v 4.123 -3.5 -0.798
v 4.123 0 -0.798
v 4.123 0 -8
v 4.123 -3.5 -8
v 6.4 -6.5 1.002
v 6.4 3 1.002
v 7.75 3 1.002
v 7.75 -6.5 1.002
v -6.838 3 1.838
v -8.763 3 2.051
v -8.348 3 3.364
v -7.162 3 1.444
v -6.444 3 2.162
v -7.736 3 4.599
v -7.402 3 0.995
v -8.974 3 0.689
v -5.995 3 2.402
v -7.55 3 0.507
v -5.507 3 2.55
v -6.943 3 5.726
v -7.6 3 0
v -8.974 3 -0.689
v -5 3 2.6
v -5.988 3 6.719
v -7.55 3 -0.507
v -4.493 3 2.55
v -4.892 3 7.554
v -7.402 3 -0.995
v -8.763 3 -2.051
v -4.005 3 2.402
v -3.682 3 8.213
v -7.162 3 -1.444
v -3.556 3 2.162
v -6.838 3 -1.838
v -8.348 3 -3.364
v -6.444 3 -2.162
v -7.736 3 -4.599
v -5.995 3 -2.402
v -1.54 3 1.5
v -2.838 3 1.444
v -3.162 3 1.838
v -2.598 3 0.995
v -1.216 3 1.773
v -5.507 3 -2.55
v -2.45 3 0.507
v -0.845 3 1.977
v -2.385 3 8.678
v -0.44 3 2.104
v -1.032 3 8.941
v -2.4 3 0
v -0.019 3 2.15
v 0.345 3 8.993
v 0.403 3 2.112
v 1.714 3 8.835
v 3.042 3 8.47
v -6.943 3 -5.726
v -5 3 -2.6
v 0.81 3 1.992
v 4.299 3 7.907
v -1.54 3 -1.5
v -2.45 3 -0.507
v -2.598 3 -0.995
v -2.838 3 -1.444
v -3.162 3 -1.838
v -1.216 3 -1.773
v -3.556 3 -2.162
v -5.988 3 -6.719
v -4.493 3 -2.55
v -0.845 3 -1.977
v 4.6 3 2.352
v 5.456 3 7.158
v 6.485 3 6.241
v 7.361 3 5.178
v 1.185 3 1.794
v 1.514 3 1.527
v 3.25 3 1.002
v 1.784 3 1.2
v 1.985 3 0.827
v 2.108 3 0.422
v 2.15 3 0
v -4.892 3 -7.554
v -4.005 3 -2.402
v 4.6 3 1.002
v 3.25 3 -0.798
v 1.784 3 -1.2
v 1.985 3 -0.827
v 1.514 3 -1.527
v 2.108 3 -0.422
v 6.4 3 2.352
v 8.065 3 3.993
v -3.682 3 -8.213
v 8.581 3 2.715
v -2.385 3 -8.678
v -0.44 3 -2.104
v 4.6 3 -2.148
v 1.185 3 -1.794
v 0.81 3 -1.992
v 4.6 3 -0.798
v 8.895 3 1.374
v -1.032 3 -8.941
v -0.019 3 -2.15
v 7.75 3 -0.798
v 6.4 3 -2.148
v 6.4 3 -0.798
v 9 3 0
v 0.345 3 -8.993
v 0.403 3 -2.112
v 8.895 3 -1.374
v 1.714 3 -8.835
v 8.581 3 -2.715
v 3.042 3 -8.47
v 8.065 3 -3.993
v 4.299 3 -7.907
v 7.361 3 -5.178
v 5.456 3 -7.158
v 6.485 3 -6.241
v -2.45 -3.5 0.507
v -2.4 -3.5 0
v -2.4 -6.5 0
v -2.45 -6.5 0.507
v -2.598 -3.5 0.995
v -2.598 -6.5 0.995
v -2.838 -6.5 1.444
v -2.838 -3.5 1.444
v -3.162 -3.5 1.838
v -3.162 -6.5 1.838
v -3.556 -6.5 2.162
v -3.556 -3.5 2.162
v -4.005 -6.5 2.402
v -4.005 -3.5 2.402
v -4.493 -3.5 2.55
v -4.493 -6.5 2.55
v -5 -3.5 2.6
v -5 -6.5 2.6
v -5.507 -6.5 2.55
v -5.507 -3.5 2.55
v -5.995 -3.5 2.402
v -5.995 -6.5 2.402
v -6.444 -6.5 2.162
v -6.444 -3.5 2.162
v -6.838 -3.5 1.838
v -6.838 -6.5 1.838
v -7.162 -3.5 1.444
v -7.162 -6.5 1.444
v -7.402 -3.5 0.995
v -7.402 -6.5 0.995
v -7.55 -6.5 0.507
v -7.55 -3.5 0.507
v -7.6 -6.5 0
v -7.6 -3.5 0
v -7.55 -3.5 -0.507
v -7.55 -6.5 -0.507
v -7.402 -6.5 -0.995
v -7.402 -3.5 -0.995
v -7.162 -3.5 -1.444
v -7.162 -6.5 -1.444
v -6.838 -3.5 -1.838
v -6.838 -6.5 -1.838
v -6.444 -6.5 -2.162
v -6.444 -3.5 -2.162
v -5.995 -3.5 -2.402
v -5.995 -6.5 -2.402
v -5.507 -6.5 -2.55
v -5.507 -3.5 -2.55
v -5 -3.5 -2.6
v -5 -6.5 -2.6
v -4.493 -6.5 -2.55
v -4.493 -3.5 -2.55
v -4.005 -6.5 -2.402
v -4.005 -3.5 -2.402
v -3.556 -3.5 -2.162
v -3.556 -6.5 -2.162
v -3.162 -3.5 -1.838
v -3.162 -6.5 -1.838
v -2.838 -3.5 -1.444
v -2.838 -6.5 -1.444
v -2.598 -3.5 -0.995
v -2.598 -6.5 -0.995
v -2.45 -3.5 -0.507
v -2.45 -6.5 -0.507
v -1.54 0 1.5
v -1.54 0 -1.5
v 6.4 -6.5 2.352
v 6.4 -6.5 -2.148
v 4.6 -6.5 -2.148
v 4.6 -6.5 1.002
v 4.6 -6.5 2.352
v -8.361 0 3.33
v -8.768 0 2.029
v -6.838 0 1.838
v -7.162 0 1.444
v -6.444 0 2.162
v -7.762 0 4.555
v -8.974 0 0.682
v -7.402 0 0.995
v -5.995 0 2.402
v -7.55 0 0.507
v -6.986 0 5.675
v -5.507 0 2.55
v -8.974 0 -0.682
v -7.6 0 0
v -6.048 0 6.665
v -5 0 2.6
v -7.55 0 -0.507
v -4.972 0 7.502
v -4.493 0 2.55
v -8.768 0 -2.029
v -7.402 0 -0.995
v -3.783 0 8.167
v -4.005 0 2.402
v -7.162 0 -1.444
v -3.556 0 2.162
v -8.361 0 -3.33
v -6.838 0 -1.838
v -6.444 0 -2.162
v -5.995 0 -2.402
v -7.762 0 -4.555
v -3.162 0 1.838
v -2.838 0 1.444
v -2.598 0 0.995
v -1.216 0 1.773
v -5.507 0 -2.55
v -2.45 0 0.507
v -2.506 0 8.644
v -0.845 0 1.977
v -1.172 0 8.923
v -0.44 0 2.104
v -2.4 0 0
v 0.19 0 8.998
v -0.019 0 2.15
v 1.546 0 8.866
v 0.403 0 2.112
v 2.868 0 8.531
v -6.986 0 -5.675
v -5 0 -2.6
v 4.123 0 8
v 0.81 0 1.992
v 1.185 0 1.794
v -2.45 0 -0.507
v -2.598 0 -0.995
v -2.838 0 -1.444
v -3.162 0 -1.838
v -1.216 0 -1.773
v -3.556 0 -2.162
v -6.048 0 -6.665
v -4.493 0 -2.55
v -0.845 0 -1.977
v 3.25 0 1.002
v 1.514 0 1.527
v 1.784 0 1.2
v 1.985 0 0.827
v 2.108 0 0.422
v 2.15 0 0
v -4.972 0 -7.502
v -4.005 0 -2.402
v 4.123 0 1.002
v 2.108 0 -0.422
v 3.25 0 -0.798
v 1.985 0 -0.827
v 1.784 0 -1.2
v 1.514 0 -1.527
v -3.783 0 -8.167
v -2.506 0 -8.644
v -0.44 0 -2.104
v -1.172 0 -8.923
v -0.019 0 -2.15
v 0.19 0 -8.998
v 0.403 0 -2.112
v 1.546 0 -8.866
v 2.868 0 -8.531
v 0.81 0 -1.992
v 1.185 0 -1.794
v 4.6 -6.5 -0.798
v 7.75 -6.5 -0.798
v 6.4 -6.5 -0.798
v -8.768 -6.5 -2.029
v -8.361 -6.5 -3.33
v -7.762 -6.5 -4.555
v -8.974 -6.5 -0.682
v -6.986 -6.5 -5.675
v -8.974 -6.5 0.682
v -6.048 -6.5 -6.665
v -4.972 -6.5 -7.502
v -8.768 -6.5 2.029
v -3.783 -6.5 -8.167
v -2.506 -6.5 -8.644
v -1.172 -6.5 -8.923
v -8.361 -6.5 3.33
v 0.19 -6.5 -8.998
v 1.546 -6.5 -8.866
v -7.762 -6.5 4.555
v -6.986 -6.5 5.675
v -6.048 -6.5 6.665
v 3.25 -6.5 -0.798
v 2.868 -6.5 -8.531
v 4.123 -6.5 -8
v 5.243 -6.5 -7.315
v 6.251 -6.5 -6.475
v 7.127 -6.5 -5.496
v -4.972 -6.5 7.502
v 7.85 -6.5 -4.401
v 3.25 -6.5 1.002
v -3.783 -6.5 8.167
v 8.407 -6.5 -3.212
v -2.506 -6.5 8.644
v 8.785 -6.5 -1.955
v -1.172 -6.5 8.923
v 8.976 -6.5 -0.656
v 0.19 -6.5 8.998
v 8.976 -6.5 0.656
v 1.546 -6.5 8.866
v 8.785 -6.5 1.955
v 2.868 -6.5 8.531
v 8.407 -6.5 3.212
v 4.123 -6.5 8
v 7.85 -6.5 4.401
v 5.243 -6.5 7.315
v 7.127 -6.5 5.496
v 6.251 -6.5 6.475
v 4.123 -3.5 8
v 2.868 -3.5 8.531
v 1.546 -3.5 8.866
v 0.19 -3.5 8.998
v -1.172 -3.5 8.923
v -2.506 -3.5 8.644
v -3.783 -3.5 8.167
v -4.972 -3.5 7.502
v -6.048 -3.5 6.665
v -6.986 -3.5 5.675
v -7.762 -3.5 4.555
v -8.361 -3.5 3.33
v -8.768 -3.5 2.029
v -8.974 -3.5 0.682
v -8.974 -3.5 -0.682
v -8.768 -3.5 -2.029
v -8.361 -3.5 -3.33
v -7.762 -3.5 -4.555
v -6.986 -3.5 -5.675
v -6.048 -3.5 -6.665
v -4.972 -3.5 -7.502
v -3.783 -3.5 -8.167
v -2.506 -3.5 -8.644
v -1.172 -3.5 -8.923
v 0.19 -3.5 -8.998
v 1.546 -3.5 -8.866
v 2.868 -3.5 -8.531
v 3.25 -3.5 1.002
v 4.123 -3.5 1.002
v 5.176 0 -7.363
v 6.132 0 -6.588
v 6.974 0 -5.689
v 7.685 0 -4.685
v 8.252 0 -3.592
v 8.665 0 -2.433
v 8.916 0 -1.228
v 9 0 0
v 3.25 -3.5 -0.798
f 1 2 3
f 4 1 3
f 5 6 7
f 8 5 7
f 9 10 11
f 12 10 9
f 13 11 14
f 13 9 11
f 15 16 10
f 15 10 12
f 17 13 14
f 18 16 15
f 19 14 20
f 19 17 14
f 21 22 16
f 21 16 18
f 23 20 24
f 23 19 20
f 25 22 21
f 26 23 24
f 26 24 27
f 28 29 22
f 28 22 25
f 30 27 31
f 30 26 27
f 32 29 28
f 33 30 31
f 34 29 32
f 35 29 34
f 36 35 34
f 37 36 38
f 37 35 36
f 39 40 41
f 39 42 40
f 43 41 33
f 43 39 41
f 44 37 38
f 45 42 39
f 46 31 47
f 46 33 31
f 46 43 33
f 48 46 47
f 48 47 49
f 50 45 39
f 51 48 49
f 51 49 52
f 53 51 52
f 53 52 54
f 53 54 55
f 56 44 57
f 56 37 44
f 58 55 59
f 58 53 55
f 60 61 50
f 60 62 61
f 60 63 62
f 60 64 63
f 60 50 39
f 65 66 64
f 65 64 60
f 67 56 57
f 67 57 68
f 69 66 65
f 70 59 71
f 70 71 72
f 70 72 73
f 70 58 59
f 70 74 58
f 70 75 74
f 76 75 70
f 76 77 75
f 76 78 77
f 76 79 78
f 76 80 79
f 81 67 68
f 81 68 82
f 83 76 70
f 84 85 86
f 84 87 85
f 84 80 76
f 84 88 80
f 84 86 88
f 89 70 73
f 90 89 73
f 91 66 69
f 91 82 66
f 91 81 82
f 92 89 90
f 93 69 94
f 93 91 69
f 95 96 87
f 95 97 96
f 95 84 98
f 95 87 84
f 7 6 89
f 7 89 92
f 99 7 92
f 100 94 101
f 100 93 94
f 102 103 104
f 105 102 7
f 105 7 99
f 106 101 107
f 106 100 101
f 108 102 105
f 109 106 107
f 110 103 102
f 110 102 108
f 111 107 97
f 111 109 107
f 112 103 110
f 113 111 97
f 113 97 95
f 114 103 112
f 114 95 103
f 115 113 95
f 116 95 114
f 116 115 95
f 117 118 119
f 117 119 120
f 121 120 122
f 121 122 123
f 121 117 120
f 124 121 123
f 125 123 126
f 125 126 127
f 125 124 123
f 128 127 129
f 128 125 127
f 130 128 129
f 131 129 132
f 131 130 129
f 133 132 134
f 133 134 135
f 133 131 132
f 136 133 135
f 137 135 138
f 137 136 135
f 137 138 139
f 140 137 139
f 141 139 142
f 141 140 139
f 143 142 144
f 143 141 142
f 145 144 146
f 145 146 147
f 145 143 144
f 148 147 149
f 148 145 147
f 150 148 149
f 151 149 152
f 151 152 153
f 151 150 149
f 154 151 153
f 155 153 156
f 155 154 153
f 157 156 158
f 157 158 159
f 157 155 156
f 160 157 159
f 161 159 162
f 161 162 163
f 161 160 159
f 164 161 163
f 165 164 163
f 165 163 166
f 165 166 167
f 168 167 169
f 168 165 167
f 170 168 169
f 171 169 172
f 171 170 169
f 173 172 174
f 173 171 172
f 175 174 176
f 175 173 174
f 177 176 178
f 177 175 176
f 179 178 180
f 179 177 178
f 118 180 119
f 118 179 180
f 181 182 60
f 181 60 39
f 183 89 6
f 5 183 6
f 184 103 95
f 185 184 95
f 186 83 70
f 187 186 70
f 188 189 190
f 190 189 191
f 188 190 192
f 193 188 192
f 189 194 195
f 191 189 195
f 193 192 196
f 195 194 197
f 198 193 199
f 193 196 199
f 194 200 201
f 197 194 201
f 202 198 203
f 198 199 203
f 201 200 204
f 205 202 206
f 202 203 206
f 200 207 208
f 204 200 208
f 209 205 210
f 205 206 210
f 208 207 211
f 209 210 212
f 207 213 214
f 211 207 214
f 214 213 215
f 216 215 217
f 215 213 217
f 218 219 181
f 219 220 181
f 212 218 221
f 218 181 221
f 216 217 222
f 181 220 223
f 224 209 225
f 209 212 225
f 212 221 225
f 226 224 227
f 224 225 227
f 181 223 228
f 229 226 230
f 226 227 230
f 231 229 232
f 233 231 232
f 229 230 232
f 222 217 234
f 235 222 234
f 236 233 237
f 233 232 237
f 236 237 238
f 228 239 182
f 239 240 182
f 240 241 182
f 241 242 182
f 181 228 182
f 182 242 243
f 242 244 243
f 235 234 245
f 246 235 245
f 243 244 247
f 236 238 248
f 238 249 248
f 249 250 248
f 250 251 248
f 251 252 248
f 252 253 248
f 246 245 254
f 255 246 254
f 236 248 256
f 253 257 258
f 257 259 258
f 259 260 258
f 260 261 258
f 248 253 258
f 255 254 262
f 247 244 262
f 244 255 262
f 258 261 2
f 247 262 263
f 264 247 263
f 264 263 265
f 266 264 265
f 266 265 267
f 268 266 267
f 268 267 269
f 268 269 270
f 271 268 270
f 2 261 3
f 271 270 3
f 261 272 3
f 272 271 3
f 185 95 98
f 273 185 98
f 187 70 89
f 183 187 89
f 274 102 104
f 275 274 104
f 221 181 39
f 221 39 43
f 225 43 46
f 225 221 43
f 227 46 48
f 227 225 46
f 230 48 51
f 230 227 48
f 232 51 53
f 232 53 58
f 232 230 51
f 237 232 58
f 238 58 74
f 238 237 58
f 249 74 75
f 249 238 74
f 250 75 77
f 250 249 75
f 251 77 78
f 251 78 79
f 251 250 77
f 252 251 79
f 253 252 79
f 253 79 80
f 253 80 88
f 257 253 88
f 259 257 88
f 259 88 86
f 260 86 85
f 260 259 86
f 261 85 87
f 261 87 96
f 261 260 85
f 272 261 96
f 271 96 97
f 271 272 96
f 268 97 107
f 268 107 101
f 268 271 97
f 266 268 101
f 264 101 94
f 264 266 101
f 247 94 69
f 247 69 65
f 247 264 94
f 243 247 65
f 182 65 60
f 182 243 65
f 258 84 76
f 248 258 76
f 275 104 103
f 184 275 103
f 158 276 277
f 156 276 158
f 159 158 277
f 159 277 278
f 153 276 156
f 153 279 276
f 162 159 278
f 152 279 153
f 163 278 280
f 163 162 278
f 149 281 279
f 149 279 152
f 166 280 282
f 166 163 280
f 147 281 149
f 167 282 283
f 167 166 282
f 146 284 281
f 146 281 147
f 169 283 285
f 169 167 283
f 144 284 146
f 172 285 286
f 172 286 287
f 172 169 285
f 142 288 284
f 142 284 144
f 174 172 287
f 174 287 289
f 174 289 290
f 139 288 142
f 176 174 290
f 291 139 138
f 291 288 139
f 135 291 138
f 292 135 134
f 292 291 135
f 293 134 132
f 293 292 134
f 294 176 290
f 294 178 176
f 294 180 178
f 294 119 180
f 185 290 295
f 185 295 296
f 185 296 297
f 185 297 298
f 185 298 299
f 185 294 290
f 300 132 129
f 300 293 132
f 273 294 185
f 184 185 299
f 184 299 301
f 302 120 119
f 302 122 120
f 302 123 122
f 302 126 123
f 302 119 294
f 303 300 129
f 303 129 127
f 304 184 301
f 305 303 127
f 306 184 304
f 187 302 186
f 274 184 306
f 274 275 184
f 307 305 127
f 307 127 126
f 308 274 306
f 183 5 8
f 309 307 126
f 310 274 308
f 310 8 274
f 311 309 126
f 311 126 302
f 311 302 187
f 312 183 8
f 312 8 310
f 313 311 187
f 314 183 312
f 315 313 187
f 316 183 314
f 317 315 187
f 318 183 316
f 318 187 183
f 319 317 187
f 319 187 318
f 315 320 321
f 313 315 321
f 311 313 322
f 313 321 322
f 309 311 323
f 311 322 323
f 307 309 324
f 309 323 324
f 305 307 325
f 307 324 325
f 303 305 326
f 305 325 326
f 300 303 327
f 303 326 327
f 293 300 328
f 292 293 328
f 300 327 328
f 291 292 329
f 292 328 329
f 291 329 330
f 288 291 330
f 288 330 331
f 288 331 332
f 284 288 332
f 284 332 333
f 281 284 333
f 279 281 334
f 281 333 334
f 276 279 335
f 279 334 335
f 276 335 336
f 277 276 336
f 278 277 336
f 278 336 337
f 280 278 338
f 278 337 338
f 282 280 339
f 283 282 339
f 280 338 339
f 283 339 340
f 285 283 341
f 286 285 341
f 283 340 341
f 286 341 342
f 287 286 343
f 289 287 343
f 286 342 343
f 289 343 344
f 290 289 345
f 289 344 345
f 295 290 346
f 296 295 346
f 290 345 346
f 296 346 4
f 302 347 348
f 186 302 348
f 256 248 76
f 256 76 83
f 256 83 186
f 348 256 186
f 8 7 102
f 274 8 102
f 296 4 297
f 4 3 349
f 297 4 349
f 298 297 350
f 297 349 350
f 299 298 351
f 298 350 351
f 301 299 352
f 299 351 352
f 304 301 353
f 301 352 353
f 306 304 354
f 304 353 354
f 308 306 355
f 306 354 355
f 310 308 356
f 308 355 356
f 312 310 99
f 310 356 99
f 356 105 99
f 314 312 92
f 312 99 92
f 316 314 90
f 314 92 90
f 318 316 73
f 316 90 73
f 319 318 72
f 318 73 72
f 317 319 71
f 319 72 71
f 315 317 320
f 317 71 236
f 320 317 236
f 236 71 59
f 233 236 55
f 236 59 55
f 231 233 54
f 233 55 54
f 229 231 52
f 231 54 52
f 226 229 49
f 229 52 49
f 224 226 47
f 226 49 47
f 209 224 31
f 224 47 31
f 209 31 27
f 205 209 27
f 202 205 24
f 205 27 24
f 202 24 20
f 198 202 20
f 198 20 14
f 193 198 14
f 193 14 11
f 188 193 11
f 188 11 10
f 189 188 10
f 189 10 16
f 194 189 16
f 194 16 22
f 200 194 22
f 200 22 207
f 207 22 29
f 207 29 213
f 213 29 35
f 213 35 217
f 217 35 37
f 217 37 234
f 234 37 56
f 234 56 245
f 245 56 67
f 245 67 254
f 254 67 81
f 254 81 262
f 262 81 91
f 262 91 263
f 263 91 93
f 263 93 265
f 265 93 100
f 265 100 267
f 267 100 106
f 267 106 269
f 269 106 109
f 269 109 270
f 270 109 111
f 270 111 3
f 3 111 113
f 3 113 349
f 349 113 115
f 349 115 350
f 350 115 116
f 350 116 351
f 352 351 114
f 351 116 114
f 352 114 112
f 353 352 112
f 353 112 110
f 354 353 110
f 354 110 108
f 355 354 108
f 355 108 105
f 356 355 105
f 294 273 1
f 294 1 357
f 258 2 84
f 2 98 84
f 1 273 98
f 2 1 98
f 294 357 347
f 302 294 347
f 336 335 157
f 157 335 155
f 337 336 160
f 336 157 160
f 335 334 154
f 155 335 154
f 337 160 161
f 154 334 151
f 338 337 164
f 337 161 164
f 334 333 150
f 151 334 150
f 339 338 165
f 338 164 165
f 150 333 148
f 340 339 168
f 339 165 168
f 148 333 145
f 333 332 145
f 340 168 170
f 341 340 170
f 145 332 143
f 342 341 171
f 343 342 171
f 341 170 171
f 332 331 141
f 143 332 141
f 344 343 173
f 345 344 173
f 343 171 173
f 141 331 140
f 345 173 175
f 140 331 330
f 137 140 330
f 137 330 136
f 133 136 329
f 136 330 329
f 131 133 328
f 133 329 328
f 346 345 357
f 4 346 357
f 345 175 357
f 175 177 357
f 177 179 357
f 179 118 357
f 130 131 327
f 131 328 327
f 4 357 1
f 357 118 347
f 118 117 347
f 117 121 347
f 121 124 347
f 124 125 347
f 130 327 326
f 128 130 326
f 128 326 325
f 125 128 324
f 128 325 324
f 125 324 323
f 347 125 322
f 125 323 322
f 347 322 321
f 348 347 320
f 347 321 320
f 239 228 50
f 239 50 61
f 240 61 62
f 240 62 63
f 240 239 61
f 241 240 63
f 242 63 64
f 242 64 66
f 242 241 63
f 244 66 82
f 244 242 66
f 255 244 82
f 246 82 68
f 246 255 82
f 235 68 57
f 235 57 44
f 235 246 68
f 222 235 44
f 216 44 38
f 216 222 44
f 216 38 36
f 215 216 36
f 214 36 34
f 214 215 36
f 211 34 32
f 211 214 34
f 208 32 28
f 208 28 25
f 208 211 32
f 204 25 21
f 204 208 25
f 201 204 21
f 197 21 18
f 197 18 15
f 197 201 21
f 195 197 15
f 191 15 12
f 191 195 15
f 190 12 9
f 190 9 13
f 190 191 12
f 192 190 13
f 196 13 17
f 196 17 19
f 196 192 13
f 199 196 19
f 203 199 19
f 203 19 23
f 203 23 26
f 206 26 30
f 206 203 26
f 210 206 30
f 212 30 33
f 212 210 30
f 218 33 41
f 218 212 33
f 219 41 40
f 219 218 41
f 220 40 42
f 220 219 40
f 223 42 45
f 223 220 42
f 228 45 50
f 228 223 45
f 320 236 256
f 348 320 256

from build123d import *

# Parameters (mm, degrees)
SKETCH1_R           = 9
SKETCH1_R_2         = 2.6
BOSS_EXTRUDE1_DEPTH = 3
BOSS_EXTRUDE2_DEPTH = 3.5
SKETCH4_R           = 2.6
BOSS_EXTRUDE3_DEPTH = 3
CUT_EXTRUDE1_DEPTH  = 10


with BuildPart() as part:
    # Sketch1 → Boss-Extrude1 (new body)
    with BuildSketch(Plane(origin=(0, 0, 0), x_dir=(1, 0, 0), z_dir=(0, 1, 0))):
        Circle(SKETCH1_R)
        with Locations((-5, 0)):
            Circle(SKETCH1_R_2, mode=Mode.SUBTRACT)
        with BuildLine():
            Line((-1.54029218, 1.5), (-1.54029218, -1.5))
            ThreePointArc((-1.54029218, -1.5), (2.15, 0), (-1.54029218, 1.5))
        make_face(mode=Mode.SUBTRACT)
    extrude(amount=BOSS_EXTRUDE1_DEPTH)

    # Sketch2 → Boss-Extrude2 (add)
    with BuildSketch(Plane.XZ):
        with BuildLine():
            Line((4.123105626, 8), (4.123105626, -8))
            ThreePointArc((4.123105626, -8), (9, 0), (4.123105626, 8))
        make_face()
    extrude(amount=BOSS_EXTRUDE2_DEPTH)

    # Sketch4 → Boss-Extrude3 (add)
    with BuildSketch(Plane.XZ.offset(3.5)):
        with BuildLine():
            ThreePointArc((4.123105626, 8), (-9, 0), (4.123105626, -8))
            ThreePointArc((4.123105626, -8), (9, 0), (4.123105626, 8))
        make_face()
        with Locations((-5, 0)):
            Circle(SKETCH4_R, mode=Mode.SUBTRACT)
    extrude(amount=BOSS_EXTRUDE3_DEPTH)

    # Sketch5 → Cut-Extrude1 (cut)
    with BuildSketch(Plane(origin=(0, 3, 0), x_dir=(1, 0, 0), z_dir=(0, 1, 0))):
        Polygon((3.25, 0.798435283), (3.25, -1.001564717), (4.6, -1.001564717), (4.6, -2.351564717), (6.4, -2.351564717), (6.4, -1.001564717), (7.75, -1.001564717), (7.75, 0.798435283), (6.4, 0.798435283), (6.4, 2.148435283), (4.6, 2.148435283), (4.6, 0.798435283), align=None)
    extrude(amount=-CUT_EXTRUDE1_DEPTH, mode=Mode.SUBTRACT)


solid = part.part
